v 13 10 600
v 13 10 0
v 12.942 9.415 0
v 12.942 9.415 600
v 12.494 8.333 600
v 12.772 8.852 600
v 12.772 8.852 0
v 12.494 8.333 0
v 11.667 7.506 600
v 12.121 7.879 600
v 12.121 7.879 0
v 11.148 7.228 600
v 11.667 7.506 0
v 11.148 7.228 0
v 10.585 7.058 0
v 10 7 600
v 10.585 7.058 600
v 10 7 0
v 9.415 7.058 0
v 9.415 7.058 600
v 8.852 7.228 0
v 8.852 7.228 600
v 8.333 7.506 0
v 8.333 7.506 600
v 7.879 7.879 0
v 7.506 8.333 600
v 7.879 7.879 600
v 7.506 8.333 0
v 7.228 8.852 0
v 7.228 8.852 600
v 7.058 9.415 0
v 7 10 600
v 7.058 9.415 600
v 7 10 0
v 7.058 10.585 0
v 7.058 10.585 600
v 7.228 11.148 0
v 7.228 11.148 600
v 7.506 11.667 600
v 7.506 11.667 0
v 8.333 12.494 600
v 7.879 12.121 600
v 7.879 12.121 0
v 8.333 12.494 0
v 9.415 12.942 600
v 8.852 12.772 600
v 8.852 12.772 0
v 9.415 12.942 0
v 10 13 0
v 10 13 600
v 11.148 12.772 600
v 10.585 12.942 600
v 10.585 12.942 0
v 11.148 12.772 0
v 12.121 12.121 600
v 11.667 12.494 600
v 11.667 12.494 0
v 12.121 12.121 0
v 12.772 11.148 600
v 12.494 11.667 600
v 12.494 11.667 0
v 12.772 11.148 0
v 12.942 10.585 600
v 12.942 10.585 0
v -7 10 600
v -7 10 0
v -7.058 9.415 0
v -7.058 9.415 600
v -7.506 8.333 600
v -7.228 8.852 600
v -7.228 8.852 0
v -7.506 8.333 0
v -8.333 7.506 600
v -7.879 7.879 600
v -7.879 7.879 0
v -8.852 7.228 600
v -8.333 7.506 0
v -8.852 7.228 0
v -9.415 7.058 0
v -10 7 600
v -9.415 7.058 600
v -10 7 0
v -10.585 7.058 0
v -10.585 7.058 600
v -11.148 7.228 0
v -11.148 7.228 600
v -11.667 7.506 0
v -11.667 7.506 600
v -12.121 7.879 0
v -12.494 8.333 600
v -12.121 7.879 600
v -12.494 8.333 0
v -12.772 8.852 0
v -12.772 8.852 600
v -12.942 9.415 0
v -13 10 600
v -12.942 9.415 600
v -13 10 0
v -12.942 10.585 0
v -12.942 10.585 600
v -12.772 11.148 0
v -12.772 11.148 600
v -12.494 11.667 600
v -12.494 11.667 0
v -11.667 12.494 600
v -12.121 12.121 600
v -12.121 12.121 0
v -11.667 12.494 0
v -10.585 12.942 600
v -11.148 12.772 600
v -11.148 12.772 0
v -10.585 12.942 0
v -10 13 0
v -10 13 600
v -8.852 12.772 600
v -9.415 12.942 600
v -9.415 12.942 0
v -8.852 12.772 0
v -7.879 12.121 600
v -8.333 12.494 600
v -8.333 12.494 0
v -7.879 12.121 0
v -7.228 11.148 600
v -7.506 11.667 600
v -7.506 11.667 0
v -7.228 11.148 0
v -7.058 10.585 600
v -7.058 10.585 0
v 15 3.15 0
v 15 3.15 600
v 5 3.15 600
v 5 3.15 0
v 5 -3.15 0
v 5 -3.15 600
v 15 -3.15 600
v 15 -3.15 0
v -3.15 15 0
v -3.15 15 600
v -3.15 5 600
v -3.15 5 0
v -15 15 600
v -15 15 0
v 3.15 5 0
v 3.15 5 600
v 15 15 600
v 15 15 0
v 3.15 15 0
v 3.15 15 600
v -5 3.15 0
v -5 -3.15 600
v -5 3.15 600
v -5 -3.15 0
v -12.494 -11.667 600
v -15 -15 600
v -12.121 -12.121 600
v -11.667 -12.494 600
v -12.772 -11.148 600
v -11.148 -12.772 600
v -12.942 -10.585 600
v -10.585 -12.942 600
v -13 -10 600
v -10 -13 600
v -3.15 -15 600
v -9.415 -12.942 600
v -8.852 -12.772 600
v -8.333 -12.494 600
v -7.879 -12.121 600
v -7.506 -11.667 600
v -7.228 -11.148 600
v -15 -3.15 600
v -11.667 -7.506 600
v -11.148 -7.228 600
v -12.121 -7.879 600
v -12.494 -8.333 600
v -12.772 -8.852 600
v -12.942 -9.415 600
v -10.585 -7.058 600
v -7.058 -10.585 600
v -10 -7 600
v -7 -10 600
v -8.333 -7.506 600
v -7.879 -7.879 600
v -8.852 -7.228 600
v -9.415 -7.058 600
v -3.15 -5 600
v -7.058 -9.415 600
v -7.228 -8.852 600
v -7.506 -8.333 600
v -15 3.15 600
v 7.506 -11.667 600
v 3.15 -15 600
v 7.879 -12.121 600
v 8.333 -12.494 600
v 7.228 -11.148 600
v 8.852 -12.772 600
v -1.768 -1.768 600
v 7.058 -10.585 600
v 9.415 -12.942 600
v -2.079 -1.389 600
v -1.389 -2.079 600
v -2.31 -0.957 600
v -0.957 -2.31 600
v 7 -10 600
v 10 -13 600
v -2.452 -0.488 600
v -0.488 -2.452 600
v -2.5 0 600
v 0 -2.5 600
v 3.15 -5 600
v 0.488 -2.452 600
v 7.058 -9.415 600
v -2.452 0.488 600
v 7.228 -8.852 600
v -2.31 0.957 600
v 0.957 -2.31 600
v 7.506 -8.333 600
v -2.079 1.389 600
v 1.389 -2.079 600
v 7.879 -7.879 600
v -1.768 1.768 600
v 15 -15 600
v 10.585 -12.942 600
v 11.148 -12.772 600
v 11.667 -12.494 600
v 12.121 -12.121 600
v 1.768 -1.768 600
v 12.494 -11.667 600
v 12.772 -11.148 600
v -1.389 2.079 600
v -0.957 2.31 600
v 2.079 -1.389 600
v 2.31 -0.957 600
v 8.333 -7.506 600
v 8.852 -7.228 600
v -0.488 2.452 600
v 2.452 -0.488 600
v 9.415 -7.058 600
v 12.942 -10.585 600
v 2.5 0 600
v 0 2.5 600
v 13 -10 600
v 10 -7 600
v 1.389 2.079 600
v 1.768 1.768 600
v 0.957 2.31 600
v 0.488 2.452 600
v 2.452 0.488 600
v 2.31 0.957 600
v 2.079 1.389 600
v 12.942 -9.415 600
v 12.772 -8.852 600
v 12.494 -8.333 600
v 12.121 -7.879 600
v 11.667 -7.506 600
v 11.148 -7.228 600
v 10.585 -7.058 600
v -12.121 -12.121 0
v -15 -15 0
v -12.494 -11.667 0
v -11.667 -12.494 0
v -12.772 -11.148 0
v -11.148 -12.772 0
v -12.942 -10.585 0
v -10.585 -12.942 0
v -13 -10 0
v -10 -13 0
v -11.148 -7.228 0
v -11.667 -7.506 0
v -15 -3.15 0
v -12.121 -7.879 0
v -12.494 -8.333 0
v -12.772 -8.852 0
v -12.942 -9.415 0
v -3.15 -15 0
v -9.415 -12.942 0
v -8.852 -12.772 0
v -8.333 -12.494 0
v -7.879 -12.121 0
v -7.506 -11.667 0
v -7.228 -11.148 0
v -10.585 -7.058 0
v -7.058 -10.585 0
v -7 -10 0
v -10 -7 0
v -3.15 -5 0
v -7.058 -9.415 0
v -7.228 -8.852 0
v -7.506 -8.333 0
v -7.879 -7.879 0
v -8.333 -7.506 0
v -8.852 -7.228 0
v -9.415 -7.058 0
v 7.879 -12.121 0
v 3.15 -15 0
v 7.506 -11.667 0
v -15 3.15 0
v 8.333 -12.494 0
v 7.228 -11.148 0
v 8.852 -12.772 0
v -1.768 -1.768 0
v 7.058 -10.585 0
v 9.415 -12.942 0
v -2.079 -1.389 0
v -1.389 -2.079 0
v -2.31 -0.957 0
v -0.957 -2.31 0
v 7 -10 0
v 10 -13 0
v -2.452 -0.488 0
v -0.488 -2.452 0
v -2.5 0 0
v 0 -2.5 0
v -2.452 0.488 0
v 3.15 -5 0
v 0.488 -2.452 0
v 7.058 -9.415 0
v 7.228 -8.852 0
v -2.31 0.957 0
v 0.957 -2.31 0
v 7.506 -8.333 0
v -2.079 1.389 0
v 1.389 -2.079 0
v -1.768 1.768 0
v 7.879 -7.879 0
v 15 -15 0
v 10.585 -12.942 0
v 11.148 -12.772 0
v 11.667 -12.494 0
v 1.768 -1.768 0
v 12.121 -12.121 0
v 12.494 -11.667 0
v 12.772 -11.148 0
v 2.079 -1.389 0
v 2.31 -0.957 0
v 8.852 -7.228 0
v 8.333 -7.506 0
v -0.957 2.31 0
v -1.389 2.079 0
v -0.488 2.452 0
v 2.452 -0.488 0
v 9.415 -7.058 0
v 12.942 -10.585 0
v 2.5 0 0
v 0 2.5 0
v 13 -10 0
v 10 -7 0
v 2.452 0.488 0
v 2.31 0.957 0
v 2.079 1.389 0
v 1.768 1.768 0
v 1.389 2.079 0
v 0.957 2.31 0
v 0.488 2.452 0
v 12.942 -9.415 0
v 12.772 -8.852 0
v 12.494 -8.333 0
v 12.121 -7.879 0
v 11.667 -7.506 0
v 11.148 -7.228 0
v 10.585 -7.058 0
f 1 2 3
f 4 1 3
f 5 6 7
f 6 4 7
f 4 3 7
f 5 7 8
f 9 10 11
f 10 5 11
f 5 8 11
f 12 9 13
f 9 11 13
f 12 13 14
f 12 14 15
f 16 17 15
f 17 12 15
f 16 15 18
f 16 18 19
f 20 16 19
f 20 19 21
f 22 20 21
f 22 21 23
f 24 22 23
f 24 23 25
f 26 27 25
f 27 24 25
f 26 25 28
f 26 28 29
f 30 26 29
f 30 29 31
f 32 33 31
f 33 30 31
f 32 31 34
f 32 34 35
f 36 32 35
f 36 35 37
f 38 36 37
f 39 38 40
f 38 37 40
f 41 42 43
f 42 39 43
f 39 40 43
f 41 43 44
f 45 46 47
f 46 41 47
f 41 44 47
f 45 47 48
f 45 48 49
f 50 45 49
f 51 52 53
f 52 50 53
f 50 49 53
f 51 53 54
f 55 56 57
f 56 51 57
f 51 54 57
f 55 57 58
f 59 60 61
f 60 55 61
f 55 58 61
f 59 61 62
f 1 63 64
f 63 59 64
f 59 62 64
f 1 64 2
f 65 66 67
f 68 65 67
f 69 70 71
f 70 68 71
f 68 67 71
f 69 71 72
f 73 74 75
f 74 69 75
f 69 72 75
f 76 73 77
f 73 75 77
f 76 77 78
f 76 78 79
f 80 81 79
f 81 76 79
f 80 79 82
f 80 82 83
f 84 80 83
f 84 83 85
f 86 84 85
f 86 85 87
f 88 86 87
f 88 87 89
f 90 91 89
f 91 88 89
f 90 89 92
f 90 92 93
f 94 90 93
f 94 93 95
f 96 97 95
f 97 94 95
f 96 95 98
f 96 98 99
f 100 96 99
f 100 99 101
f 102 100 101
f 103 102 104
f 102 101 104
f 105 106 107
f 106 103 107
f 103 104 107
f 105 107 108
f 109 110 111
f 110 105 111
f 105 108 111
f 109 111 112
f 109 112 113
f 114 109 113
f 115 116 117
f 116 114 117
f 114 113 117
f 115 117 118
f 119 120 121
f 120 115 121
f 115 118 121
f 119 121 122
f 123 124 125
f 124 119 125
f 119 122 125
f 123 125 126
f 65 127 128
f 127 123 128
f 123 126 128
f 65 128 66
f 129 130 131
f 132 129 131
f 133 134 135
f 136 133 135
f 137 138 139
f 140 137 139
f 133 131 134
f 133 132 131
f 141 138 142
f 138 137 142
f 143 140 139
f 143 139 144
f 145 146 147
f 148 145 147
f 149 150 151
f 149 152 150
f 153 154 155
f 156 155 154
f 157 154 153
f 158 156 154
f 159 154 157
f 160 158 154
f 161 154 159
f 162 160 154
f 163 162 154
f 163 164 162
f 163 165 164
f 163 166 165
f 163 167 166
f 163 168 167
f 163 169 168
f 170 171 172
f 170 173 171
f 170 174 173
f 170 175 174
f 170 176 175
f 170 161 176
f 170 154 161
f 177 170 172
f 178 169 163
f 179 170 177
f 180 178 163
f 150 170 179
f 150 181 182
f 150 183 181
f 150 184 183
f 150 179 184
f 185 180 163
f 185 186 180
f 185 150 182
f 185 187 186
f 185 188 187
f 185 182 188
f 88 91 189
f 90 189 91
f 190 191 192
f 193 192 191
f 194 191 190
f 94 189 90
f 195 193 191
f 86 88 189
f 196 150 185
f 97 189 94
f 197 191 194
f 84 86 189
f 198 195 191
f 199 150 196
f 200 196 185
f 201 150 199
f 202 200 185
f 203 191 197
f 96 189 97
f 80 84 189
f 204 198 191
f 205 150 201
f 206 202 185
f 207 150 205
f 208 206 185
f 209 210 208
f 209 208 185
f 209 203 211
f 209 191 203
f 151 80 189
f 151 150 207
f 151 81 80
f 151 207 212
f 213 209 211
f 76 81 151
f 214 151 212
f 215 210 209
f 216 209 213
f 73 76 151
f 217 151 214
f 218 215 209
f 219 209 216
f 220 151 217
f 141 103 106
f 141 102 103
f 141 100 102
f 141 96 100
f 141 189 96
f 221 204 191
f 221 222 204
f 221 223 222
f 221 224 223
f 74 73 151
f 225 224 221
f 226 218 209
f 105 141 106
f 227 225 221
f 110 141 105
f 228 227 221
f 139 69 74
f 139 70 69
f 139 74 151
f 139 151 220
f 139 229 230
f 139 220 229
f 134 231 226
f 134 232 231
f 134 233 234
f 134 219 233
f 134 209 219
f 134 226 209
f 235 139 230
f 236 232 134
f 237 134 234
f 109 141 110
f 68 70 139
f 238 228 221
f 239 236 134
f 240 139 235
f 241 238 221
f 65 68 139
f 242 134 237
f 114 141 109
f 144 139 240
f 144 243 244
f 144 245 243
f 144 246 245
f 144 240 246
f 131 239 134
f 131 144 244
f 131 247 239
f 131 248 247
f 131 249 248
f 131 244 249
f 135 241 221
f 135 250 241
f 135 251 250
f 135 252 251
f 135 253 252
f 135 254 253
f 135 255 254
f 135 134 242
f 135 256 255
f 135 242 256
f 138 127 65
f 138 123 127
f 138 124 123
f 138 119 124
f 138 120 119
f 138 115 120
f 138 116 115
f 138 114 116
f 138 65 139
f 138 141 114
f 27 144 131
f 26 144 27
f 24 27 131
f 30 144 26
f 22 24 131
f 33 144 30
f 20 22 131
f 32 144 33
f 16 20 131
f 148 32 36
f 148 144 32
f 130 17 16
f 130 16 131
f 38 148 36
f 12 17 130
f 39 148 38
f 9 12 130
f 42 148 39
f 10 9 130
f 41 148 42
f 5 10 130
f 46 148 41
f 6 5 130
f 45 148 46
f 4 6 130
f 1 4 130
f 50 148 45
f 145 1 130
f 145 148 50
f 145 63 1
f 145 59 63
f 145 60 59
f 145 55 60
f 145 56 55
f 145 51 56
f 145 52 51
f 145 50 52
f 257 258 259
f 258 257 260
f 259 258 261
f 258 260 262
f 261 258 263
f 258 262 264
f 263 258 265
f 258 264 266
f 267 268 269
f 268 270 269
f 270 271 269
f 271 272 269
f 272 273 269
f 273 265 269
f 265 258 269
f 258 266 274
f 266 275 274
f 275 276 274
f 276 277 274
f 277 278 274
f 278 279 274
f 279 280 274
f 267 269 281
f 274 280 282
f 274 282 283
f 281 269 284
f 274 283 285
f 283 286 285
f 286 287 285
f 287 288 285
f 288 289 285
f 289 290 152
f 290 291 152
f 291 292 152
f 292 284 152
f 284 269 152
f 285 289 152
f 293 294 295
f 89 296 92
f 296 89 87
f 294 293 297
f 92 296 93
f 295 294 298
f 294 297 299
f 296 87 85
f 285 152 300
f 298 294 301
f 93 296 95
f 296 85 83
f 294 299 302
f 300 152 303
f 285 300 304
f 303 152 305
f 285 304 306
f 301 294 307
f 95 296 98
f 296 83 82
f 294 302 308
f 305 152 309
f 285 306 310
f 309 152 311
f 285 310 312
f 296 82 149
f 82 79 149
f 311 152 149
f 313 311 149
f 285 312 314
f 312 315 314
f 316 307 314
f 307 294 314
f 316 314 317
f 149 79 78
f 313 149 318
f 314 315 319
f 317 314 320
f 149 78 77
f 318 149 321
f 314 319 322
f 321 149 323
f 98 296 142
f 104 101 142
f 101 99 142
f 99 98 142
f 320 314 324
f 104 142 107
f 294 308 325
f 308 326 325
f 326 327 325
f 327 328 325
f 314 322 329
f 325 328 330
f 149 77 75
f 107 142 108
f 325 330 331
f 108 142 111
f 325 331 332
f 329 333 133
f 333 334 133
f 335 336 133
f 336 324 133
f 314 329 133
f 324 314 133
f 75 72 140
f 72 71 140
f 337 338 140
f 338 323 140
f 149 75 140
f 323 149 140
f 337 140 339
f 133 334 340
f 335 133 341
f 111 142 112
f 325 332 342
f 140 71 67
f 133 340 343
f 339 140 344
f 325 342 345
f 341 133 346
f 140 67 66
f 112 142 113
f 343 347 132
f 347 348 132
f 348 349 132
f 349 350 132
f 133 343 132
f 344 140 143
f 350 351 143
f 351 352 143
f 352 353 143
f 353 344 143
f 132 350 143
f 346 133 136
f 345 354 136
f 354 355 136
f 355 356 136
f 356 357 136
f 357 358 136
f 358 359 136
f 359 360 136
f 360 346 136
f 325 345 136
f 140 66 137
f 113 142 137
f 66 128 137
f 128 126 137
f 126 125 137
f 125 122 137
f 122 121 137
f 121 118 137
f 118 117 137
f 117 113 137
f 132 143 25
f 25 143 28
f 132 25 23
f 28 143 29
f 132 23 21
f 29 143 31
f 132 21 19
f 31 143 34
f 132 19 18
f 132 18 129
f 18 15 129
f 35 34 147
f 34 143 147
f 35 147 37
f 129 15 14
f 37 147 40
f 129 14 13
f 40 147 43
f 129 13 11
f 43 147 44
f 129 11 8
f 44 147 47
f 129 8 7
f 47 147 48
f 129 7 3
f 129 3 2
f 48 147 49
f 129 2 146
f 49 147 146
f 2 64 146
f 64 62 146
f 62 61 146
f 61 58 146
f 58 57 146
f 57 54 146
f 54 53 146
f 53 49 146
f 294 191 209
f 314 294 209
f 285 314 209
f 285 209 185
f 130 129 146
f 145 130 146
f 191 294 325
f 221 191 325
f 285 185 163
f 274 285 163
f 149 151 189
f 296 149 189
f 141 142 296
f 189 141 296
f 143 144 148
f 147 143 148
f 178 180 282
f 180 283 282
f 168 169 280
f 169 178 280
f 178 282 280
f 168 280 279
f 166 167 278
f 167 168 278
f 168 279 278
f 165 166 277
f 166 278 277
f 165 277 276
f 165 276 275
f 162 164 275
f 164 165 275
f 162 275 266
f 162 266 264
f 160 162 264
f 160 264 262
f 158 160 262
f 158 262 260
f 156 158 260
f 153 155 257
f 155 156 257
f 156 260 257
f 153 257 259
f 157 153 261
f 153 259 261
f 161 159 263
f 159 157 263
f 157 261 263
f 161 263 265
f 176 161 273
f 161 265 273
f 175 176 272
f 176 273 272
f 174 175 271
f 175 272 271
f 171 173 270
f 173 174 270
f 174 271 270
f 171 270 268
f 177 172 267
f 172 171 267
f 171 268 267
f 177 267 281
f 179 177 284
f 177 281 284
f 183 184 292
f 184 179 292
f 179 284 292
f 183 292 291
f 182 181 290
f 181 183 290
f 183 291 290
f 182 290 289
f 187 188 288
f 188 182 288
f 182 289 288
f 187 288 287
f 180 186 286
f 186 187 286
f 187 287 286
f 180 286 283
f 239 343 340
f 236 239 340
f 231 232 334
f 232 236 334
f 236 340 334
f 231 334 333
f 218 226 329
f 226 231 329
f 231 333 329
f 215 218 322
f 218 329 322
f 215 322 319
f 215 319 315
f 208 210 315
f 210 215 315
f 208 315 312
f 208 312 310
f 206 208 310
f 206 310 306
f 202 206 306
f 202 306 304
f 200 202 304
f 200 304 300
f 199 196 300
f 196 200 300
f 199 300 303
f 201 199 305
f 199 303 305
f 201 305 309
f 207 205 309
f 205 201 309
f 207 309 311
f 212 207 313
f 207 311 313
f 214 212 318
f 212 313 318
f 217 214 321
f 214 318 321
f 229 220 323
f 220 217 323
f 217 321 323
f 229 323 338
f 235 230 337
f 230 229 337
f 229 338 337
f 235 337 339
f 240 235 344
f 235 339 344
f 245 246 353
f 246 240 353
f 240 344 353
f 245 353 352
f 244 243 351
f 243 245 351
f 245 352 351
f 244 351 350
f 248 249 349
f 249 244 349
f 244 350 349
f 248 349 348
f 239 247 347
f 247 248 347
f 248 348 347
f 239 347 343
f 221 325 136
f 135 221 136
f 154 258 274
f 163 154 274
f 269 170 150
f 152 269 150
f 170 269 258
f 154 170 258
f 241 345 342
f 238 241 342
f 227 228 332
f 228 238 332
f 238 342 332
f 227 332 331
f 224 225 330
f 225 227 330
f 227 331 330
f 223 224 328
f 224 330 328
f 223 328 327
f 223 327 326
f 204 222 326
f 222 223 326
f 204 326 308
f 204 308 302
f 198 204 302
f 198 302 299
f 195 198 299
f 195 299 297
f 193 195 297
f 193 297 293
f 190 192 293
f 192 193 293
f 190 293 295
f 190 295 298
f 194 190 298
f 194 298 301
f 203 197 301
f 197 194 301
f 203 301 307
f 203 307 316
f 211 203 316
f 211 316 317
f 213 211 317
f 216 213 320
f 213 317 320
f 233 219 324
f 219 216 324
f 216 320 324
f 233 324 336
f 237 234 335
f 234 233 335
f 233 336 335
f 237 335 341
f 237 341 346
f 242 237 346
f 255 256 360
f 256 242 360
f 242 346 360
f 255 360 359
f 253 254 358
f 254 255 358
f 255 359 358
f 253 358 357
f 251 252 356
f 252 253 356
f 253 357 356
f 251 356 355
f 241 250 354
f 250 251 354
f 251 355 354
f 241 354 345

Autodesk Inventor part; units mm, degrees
ref_plane "YZ Plane" through (0, 0, 0) normal (1, 0, 0) x (0, 1, 0)
ref_plane "XZ Plane" through (0, 0, 0) normal (0, 1, 0) x (-1, 0, 0)
ref_plane "XY Plane" through (0, 0, 0) normal (0, 0, 1) x (1, 0, 0)
sketch "스케치1" plane through (0, 0, 0) normal (0, 0, 1) x (1, 0, 0)
  line L0 (15, 15) -> (-15, 15)
  line L1 (-15, 15) -> (-15, -15)
  line L2 (-15, -15) -> (15, -15)
  line L3 (15, -15) -> (15, 15)
  circle A0 centre (0, 0) radius 2.5
  circle A1 centre (-10, 10) radius 3
  circle A2 centre (10, 10) radius 3
  circle A3 centre (10, -10) radius 3
  circle A4 centre (-10, -10) radius 3
  line L4 (3.15, 15) -> (-3.15, 15)
  line L5 (-3.15, 15) -> (-3.15, 5)
  line L6 (-3.15, 5) -> (3.15, 5)
  line L7 (3.15, 5) -> (3.15, 15)
  line L8 (-15, -3.15) -> (-5, -3.15)
  line L9 (-5, 3.15) -> (-15, 3.15)
  line L10 (-5, -3.15) -> (-5, 3.15)
  line L11 (-15, 3.15) -> (-15, -3.15)
  line L12 (3.15, -15) -> (3.15, -5)
  line L13 (-3.15, -5) -> (-3.15, -15)
  line L14 (3.15, -5) -> (-3.15, -5)
  line L15 (-3.15, -15) -> (3.15, -15)
  line L16 (15, 3.15) -> (5, 3.15)
  line L17 (5, -3.15) -> (15, -3.15)
  line L18 (5, 3.15) -> (5, -3.15)
  line L19 (15, -3.15) -> (15, 3.15)
  dimension "d0" = 30
  dimension "d1" = 15
  dimension "d2" = 30
  dimension "d3" = 15
  dimension "d4" = 20
  dimension "d5" = 10
  dimension "d6" = 20
  dimension "d7" = 10
  dimension "d8" = 20
  dimension "d9" = 20
  dimension "d10" = 10
  dimension "d11" = 10
  dimension "d12" = 6
  dimension "d13" = 6
  dimension "d14" = 6
  dimension "d15" = 6
  dimension "d16" = 5
  dimension "d17" = 0
  dimension "d18" = 6.3
  dimension "d19" = 3.15
  dimension "d20" = 10
  dimension "d23" = 360
extrude "돌출1" add sketch "스케치1" along normal blind 600 contours L3 L16 L18 L17 L2 L12 L14 L13 L1 L8 L10 L9 L0 L5 L6 L7
equation "\"TransitionRadius\" = BendRadius"
equation "\"BendRadius\" = 0.5"
properties part number "3030600"
